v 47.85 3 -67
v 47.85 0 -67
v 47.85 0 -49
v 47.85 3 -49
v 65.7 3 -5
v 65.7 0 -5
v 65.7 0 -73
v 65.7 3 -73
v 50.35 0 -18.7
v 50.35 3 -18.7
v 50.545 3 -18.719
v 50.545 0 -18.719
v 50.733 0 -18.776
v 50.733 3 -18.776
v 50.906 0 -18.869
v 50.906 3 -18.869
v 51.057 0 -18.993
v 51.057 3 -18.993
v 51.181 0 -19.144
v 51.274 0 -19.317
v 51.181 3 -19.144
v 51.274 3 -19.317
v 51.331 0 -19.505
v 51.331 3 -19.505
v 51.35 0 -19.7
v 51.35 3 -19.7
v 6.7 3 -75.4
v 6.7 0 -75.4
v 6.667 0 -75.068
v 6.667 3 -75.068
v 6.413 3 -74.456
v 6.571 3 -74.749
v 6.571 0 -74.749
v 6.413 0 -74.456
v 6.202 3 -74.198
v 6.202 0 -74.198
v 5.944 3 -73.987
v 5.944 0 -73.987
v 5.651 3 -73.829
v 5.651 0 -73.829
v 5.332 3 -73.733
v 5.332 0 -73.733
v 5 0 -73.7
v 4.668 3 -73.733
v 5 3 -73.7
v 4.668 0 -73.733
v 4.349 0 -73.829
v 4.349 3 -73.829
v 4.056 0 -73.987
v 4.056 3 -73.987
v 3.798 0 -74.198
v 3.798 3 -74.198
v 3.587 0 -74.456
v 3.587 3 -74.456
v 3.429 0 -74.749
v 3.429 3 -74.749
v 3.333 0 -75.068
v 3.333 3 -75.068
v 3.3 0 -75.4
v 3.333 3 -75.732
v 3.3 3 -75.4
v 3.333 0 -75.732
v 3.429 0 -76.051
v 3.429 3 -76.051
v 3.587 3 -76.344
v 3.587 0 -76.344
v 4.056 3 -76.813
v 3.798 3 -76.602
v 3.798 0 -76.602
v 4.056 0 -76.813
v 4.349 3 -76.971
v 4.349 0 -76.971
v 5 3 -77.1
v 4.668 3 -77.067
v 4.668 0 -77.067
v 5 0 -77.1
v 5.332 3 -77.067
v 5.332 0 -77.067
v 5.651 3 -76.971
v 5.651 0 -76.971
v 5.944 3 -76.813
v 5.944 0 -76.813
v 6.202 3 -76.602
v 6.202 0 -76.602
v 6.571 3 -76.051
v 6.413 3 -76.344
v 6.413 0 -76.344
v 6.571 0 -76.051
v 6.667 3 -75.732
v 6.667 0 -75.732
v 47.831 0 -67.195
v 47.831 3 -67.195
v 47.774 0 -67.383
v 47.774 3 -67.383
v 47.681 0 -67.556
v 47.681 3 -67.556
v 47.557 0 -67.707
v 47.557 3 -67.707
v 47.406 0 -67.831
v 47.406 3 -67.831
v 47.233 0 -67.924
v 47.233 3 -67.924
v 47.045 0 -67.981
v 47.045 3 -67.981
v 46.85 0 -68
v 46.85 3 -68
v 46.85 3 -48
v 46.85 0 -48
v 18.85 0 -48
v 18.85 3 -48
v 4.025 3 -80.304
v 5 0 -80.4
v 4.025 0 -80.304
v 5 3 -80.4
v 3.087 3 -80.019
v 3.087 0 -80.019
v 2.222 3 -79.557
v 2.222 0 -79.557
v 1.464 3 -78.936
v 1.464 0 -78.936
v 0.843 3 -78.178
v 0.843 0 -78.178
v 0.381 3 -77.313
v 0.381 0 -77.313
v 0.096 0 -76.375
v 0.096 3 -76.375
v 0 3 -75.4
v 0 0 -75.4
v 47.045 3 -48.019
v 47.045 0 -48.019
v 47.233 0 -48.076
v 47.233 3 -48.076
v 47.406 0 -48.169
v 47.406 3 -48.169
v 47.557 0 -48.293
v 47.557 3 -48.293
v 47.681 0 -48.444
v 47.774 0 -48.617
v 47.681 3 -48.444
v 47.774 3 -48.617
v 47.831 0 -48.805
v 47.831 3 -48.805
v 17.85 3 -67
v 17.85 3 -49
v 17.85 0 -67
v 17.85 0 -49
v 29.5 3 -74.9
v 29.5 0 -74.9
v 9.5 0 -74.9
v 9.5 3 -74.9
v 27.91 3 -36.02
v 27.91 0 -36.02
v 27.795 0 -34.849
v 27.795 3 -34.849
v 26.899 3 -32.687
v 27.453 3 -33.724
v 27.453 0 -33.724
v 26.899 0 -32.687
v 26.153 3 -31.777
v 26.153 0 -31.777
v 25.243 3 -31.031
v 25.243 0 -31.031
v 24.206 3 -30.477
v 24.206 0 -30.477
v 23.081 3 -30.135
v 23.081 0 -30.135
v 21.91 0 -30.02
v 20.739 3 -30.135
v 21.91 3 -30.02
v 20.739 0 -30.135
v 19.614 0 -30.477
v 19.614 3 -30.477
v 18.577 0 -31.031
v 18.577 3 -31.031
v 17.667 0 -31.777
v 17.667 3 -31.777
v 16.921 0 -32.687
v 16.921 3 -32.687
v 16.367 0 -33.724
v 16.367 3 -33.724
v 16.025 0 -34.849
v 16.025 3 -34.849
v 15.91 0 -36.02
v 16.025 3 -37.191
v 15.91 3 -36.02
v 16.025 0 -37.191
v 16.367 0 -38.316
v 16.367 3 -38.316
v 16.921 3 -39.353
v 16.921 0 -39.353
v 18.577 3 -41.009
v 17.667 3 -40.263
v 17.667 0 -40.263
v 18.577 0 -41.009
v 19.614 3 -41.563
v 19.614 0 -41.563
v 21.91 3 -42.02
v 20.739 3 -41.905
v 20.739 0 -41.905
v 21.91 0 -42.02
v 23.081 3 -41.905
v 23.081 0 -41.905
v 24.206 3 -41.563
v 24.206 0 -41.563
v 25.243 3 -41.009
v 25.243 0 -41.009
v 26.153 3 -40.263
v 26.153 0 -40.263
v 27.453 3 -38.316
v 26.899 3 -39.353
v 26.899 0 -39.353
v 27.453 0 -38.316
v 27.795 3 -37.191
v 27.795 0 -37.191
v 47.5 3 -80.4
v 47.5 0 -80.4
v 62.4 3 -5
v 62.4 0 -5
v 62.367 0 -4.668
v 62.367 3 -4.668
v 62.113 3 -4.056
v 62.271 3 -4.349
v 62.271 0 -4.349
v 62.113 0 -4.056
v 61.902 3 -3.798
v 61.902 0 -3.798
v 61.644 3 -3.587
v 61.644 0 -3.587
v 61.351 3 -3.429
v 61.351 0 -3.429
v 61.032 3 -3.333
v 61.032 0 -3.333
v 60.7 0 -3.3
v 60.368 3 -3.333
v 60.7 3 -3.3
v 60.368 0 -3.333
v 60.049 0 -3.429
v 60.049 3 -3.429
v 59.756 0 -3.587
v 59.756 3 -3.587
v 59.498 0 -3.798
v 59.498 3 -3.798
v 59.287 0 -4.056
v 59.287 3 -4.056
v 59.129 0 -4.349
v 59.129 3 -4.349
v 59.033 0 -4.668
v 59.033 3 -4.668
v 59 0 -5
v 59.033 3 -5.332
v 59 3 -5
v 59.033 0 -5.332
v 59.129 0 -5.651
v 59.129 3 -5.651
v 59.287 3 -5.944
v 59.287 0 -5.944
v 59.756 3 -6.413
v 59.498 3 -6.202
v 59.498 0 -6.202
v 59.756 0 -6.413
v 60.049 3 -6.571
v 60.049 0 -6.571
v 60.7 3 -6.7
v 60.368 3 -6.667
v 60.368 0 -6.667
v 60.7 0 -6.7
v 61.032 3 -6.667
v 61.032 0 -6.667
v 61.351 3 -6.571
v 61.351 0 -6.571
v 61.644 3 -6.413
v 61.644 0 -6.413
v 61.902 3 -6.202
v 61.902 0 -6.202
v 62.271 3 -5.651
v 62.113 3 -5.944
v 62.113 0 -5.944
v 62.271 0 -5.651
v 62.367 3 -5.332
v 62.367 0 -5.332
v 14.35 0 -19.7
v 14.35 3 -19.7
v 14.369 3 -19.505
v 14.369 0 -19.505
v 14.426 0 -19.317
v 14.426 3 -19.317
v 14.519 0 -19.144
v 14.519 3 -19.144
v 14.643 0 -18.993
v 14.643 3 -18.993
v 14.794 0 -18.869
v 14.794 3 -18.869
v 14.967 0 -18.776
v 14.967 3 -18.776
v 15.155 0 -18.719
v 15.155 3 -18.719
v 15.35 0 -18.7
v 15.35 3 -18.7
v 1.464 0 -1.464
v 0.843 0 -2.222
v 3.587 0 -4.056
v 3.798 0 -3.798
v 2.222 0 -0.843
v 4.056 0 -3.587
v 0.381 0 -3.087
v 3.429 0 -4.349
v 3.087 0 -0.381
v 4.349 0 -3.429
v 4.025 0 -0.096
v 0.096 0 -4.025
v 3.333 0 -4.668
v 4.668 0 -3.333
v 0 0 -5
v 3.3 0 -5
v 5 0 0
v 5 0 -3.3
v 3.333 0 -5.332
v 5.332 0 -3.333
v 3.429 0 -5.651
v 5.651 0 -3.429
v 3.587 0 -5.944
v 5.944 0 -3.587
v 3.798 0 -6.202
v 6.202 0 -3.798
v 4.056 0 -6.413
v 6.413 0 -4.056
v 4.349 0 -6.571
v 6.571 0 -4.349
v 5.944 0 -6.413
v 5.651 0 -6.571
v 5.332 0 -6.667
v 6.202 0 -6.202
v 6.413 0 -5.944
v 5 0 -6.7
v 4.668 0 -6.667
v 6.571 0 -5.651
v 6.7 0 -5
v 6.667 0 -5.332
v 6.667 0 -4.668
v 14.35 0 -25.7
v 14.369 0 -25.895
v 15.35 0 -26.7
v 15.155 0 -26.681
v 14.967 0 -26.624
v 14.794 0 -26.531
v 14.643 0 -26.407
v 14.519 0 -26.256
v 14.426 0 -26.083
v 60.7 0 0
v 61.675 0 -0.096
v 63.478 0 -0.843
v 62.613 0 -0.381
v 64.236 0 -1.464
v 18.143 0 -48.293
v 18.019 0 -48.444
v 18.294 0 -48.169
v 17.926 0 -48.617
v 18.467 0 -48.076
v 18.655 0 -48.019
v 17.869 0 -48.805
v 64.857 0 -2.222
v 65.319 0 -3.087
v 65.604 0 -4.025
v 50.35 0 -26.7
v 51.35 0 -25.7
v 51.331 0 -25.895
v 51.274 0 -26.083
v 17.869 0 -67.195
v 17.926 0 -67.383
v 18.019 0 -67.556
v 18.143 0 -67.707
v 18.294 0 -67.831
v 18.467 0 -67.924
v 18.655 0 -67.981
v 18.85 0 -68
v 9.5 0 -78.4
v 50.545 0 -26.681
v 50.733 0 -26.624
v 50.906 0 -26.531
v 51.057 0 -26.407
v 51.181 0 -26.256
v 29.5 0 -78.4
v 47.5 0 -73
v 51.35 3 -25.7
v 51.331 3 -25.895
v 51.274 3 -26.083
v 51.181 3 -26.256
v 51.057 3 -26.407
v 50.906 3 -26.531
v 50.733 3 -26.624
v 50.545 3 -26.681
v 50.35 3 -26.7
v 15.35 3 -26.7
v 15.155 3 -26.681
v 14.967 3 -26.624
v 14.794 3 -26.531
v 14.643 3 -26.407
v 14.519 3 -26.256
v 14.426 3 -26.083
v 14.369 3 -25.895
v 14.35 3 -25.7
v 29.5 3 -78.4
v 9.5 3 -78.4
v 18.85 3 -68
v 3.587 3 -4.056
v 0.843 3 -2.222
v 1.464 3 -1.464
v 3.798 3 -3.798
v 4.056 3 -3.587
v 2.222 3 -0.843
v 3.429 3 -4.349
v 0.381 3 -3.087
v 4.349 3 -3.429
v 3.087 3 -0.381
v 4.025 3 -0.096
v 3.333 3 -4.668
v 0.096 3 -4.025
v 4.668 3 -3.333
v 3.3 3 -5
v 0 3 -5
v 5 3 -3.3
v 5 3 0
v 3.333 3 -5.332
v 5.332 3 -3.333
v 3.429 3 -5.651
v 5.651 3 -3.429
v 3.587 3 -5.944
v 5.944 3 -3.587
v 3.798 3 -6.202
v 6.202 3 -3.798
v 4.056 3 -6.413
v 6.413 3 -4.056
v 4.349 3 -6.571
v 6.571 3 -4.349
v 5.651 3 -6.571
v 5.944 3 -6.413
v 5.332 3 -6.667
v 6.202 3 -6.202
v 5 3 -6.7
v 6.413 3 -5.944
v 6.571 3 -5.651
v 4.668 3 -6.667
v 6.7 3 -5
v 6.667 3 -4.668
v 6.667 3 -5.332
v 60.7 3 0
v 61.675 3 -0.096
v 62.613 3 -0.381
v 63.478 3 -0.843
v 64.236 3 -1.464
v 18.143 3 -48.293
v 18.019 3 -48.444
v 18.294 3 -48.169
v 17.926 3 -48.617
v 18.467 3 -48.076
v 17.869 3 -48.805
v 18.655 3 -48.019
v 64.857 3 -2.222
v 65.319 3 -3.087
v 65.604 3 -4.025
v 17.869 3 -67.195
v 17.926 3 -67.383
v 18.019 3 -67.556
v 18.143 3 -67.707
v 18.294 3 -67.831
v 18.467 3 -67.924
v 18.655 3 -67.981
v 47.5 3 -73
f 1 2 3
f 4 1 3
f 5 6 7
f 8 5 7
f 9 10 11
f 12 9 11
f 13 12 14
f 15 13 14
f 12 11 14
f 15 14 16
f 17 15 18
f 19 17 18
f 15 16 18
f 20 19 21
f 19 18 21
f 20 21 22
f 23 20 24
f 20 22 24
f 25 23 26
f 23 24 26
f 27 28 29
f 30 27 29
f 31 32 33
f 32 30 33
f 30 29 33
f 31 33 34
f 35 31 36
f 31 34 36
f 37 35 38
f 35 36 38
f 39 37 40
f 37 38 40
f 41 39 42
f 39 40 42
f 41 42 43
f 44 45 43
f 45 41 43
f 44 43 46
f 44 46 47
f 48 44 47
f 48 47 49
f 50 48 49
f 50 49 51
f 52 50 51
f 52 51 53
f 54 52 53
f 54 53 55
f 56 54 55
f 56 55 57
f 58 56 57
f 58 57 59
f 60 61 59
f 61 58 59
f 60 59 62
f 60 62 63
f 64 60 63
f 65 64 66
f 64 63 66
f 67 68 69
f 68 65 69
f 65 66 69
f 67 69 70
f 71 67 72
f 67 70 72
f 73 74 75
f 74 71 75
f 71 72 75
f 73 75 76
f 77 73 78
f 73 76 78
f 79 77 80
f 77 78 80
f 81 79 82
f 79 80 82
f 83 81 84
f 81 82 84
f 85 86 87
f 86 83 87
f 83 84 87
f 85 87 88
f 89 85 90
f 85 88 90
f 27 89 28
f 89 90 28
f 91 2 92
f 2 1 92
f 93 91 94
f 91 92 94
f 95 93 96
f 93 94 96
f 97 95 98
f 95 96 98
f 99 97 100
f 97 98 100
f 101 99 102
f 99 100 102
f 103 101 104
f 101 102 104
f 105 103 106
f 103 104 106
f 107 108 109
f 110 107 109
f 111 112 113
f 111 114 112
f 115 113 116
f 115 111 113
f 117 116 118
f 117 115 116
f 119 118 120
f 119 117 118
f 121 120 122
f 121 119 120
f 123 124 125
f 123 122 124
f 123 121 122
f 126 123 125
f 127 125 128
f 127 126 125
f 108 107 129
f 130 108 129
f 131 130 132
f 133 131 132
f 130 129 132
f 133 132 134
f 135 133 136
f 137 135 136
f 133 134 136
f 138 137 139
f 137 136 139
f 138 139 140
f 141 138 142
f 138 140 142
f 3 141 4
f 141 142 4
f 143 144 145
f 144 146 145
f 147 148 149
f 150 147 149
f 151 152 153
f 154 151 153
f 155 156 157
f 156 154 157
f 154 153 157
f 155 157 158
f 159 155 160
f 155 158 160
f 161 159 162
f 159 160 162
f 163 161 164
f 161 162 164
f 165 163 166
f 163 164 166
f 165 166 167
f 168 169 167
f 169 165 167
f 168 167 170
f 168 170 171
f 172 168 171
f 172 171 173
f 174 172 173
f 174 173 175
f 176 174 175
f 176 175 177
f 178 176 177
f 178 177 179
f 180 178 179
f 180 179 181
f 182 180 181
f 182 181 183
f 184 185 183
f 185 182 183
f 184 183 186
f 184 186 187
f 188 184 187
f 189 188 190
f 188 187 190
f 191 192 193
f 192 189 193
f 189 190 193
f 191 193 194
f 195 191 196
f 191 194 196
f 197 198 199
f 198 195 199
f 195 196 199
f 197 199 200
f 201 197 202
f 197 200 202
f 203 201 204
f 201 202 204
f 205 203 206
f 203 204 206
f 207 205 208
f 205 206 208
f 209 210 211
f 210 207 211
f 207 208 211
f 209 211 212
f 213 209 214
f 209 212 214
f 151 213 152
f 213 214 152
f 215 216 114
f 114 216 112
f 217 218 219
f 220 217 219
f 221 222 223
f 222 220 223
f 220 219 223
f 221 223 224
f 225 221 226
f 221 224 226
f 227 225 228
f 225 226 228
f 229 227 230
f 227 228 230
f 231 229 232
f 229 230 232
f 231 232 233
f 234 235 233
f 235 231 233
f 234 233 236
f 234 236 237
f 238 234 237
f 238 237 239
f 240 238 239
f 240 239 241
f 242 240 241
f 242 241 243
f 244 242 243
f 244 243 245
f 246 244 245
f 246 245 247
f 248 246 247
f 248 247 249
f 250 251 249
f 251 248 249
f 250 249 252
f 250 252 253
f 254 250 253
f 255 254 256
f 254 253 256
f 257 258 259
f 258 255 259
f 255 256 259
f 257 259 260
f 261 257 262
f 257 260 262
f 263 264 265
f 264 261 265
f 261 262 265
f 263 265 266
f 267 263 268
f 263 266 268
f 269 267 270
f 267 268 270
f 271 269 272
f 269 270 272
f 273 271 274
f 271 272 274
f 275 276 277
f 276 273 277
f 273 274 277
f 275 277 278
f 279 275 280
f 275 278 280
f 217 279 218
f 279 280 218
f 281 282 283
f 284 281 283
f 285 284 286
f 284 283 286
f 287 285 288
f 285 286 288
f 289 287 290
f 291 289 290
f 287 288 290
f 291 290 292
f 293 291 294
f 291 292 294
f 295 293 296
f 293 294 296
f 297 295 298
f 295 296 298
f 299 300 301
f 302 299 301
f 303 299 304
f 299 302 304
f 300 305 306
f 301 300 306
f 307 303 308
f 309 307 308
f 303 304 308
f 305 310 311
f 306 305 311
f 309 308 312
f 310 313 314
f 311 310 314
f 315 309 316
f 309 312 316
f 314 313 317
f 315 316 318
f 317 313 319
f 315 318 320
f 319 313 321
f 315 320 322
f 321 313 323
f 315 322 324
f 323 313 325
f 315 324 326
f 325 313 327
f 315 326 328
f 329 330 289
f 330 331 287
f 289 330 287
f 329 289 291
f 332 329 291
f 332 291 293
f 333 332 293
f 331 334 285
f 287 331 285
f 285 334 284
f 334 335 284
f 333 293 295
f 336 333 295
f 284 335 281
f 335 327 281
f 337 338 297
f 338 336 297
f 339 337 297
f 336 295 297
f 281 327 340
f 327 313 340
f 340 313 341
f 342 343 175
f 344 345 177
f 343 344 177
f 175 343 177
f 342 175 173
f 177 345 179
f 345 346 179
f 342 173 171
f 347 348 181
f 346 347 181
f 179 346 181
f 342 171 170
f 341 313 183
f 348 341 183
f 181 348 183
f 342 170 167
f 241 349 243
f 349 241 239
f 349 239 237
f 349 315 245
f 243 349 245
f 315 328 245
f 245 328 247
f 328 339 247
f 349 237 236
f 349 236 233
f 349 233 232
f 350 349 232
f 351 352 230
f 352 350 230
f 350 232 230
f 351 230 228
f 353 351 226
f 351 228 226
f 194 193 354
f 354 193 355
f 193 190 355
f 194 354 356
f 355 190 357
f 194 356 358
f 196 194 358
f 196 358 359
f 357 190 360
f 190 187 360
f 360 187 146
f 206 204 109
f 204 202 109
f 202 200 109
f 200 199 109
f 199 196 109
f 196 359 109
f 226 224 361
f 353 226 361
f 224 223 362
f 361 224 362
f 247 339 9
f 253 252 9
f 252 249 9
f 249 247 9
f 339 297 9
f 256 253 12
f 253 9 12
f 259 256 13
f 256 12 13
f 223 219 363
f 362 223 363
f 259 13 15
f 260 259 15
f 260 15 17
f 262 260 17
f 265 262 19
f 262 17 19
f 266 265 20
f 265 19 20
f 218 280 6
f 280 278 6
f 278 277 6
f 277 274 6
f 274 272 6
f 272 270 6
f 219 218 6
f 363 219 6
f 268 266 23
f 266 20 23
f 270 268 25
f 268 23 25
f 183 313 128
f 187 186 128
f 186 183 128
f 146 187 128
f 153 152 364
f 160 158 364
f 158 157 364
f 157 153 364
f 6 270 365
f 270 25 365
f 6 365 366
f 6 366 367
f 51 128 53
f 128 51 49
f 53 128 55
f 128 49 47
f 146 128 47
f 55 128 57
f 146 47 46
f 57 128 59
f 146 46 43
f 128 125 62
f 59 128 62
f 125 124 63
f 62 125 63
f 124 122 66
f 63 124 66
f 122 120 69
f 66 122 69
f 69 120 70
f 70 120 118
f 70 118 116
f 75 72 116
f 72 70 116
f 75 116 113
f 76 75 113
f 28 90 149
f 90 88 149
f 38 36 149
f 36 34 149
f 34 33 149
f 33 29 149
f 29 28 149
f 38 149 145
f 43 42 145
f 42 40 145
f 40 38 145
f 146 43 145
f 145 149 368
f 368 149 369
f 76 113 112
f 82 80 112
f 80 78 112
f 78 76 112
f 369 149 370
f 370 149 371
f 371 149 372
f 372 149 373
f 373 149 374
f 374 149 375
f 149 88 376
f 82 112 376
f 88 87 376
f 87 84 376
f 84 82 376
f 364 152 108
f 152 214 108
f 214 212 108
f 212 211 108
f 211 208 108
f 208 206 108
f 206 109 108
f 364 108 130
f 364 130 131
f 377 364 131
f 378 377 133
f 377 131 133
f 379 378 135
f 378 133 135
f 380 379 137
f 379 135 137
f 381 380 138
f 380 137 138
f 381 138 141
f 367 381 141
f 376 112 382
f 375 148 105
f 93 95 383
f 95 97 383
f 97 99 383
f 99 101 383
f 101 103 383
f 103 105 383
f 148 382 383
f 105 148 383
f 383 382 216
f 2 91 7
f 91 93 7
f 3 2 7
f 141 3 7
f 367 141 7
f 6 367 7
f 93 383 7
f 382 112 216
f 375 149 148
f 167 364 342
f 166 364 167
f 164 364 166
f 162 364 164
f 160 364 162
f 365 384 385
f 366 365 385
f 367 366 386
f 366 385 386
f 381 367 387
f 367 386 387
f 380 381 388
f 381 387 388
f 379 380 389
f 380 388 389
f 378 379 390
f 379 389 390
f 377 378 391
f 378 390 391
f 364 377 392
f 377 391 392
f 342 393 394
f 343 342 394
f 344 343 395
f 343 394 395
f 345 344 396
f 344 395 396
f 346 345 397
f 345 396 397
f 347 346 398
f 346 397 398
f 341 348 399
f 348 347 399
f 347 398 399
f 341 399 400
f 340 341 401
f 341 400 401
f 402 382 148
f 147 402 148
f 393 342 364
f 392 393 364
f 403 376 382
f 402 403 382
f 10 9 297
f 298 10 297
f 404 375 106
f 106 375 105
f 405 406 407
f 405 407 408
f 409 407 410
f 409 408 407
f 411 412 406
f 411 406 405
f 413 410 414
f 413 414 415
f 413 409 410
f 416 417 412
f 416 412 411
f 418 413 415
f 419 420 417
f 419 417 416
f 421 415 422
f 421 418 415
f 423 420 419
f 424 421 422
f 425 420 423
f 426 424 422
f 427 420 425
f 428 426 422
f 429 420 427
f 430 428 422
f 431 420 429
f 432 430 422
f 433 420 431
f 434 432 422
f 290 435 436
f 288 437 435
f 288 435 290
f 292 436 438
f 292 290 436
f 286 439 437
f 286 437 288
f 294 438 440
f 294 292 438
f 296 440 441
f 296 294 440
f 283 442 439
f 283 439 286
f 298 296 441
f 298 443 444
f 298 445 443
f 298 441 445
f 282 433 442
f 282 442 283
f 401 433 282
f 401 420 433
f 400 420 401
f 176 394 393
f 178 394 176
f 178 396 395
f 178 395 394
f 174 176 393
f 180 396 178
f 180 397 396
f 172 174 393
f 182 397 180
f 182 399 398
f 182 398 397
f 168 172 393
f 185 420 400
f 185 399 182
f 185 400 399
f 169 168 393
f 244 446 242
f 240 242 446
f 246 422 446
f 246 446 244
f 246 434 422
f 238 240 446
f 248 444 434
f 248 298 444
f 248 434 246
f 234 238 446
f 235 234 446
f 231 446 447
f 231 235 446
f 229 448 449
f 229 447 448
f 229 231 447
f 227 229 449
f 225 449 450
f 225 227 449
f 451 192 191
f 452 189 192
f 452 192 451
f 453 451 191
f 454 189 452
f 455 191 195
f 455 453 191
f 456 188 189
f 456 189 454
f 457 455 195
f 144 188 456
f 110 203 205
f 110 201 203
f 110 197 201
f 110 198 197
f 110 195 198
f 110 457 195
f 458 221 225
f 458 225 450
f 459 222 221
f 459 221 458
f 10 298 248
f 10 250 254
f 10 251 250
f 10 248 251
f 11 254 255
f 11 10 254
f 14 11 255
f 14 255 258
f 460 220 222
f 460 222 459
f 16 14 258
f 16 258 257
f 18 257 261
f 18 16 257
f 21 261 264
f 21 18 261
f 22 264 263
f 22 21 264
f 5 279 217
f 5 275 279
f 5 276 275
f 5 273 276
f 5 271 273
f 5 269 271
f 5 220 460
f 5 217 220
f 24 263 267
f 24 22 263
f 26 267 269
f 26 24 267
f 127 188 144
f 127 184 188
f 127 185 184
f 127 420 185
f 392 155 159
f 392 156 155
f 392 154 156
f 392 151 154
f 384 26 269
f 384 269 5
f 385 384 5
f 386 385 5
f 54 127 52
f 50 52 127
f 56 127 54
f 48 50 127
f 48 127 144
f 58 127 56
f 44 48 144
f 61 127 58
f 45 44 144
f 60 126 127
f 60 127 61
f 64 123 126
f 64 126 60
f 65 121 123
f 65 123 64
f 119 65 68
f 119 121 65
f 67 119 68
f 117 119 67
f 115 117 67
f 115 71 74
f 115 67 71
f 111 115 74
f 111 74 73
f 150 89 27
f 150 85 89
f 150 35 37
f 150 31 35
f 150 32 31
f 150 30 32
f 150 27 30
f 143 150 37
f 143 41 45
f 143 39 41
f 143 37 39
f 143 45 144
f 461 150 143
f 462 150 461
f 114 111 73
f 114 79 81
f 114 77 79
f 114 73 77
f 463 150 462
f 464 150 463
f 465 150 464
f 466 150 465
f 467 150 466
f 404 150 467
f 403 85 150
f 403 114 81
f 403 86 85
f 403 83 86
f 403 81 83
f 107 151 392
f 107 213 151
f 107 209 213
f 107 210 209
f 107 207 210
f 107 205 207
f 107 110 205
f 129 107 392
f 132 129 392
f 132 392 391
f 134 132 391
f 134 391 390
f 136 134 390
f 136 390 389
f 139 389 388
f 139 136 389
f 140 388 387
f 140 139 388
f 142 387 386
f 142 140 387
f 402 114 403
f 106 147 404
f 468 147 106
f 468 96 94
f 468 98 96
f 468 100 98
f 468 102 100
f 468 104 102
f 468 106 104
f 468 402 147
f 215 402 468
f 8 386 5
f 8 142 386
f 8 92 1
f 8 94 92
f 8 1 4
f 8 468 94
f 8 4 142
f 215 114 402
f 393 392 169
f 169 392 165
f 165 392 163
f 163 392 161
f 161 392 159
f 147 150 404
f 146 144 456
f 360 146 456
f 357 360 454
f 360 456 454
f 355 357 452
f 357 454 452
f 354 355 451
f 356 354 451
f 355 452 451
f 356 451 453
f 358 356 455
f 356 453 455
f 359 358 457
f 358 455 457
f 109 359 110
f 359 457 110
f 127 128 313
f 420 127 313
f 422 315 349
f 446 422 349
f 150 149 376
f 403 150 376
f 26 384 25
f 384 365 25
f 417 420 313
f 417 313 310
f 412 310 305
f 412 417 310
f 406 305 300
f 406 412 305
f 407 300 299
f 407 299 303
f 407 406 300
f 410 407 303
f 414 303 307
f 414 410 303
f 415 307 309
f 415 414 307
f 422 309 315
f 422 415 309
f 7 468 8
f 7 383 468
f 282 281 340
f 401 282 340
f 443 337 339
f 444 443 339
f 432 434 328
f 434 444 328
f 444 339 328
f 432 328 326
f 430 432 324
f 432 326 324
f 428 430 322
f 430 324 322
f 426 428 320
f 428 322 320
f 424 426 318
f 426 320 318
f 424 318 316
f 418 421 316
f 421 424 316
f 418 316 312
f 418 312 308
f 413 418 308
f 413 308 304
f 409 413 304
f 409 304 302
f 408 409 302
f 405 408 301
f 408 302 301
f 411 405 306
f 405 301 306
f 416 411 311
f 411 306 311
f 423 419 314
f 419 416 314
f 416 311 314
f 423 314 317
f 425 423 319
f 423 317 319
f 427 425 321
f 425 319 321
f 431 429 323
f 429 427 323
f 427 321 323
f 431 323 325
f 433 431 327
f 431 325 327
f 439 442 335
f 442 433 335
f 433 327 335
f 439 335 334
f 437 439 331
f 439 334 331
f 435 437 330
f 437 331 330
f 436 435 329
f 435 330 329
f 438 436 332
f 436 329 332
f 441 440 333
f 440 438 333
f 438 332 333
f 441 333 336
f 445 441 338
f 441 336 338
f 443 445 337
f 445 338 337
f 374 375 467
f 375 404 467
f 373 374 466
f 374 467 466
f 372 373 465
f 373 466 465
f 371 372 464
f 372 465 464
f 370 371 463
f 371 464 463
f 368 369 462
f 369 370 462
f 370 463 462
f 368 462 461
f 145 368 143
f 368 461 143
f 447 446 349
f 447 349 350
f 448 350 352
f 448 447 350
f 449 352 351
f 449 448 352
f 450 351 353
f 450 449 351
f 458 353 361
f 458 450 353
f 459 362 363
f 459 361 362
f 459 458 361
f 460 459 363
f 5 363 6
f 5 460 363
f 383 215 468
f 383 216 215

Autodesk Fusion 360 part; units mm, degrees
sketch "Sketch1" plane through (0, 0, 0) normal (0, 1, 0) x (1, 0, 0)
  line L0 (0, 0) -> (65.7, 0)
  line L1 (65.7, 0) -> (65.7, 80.4)
  line L2 (65.7, 80.4) -> (0, 80.4)
  line L3 (0, 80.4) -> (0, 0)
  circle A0 centre (5, 5) radius 1.7
  circle A1 centre (60.7, 5) radius 1.7
  circle A2 centre (5, 75.4) radius 1.7
  line L4 (65.7, 80.4) -> (47.5, 80.4)
  line L5 (47.5, 80.4) -> (47.5, 73)
  line L6 (47.5, 73) -> (65.7, 73)
  line L7 (65.7, 73) -> (65.7, 80.4)
  line L8 (9.5, 78.4) -> (29.5, 78.4)
  line L9 (29.5, 78.4) -> (29.5, 74.9)
  line L10 (29.5, 74.9) -> (9.5, 74.9)
  line L11 (9.5, 74.9) -> (9.5, 78.4)
  line L12 (14.35, 26.7) -> (51.35, 26.7)
  line L13 (51.35, 26.7) -> (51.35, 18.7)
  line L14 (51.35, 18.7) -> (14.35, 18.7)
  line L15 (14.35, 18.7) -> (14.35, 26.7)
  line L16 (17.85, 68) -> (47.85, 68)
  line L17 (47.85, 68) -> (47.85, 48)
  line L18 (47.85, 48) -> (17.85, 48)
  line L19 (17.85, 48) -> (17.85, 68)
  circle A3 centre (21.91, 36.02) radius 6
  dimension "d1" = 65.7
  dimension "d2" = 80.4
  dimension "d3" = 3.4
  dimension "d4" = 5
  dimension "d5" = 5
  dimension "d7" = 3.4
  dimension "d8" = 5
  dimension "d9" = 5
  dimension "d11" = 3.4
  dimension "d12" = 5
  dimension "d13" = 5
  dimension "d15" = 18.2
  dimension "d16" = 7.4
  dimension "d17" = 20
  dimension "d18" = 3.5
  dimension "d19" = 2
  dimension "d20" = 9.5
  dimension "d27" = 37
  dimension "d28" = 8
  dimension "d30" = 30
  dimension "d31" = 20
  dimension "d34" = 12
  dimension "d36" = 9.32
  dimension "d43" = 17.85
extrude "Extrude1" add sketch "Sketch1" along normal blind 3 contours L0 L1 L2 L3 L5 L6
fillet "Fillet1" radius 5 3 edges at (65.7, 1.5, 0) (0, 1.5, 0) (0, 1.5, -80.4)
fillet "Fillet2" radius 1 8 edges at (17.85, 1.5, -68) (14.35, 1.5, -26.7) (47.85, 1.5, -68) (51.35, 1.5, -26.7) (51.35, 1.5, -18.7) (47.85, 1.5, -48) (17.85, 1.5, -48) (14.35, 1.5, -18.7)
